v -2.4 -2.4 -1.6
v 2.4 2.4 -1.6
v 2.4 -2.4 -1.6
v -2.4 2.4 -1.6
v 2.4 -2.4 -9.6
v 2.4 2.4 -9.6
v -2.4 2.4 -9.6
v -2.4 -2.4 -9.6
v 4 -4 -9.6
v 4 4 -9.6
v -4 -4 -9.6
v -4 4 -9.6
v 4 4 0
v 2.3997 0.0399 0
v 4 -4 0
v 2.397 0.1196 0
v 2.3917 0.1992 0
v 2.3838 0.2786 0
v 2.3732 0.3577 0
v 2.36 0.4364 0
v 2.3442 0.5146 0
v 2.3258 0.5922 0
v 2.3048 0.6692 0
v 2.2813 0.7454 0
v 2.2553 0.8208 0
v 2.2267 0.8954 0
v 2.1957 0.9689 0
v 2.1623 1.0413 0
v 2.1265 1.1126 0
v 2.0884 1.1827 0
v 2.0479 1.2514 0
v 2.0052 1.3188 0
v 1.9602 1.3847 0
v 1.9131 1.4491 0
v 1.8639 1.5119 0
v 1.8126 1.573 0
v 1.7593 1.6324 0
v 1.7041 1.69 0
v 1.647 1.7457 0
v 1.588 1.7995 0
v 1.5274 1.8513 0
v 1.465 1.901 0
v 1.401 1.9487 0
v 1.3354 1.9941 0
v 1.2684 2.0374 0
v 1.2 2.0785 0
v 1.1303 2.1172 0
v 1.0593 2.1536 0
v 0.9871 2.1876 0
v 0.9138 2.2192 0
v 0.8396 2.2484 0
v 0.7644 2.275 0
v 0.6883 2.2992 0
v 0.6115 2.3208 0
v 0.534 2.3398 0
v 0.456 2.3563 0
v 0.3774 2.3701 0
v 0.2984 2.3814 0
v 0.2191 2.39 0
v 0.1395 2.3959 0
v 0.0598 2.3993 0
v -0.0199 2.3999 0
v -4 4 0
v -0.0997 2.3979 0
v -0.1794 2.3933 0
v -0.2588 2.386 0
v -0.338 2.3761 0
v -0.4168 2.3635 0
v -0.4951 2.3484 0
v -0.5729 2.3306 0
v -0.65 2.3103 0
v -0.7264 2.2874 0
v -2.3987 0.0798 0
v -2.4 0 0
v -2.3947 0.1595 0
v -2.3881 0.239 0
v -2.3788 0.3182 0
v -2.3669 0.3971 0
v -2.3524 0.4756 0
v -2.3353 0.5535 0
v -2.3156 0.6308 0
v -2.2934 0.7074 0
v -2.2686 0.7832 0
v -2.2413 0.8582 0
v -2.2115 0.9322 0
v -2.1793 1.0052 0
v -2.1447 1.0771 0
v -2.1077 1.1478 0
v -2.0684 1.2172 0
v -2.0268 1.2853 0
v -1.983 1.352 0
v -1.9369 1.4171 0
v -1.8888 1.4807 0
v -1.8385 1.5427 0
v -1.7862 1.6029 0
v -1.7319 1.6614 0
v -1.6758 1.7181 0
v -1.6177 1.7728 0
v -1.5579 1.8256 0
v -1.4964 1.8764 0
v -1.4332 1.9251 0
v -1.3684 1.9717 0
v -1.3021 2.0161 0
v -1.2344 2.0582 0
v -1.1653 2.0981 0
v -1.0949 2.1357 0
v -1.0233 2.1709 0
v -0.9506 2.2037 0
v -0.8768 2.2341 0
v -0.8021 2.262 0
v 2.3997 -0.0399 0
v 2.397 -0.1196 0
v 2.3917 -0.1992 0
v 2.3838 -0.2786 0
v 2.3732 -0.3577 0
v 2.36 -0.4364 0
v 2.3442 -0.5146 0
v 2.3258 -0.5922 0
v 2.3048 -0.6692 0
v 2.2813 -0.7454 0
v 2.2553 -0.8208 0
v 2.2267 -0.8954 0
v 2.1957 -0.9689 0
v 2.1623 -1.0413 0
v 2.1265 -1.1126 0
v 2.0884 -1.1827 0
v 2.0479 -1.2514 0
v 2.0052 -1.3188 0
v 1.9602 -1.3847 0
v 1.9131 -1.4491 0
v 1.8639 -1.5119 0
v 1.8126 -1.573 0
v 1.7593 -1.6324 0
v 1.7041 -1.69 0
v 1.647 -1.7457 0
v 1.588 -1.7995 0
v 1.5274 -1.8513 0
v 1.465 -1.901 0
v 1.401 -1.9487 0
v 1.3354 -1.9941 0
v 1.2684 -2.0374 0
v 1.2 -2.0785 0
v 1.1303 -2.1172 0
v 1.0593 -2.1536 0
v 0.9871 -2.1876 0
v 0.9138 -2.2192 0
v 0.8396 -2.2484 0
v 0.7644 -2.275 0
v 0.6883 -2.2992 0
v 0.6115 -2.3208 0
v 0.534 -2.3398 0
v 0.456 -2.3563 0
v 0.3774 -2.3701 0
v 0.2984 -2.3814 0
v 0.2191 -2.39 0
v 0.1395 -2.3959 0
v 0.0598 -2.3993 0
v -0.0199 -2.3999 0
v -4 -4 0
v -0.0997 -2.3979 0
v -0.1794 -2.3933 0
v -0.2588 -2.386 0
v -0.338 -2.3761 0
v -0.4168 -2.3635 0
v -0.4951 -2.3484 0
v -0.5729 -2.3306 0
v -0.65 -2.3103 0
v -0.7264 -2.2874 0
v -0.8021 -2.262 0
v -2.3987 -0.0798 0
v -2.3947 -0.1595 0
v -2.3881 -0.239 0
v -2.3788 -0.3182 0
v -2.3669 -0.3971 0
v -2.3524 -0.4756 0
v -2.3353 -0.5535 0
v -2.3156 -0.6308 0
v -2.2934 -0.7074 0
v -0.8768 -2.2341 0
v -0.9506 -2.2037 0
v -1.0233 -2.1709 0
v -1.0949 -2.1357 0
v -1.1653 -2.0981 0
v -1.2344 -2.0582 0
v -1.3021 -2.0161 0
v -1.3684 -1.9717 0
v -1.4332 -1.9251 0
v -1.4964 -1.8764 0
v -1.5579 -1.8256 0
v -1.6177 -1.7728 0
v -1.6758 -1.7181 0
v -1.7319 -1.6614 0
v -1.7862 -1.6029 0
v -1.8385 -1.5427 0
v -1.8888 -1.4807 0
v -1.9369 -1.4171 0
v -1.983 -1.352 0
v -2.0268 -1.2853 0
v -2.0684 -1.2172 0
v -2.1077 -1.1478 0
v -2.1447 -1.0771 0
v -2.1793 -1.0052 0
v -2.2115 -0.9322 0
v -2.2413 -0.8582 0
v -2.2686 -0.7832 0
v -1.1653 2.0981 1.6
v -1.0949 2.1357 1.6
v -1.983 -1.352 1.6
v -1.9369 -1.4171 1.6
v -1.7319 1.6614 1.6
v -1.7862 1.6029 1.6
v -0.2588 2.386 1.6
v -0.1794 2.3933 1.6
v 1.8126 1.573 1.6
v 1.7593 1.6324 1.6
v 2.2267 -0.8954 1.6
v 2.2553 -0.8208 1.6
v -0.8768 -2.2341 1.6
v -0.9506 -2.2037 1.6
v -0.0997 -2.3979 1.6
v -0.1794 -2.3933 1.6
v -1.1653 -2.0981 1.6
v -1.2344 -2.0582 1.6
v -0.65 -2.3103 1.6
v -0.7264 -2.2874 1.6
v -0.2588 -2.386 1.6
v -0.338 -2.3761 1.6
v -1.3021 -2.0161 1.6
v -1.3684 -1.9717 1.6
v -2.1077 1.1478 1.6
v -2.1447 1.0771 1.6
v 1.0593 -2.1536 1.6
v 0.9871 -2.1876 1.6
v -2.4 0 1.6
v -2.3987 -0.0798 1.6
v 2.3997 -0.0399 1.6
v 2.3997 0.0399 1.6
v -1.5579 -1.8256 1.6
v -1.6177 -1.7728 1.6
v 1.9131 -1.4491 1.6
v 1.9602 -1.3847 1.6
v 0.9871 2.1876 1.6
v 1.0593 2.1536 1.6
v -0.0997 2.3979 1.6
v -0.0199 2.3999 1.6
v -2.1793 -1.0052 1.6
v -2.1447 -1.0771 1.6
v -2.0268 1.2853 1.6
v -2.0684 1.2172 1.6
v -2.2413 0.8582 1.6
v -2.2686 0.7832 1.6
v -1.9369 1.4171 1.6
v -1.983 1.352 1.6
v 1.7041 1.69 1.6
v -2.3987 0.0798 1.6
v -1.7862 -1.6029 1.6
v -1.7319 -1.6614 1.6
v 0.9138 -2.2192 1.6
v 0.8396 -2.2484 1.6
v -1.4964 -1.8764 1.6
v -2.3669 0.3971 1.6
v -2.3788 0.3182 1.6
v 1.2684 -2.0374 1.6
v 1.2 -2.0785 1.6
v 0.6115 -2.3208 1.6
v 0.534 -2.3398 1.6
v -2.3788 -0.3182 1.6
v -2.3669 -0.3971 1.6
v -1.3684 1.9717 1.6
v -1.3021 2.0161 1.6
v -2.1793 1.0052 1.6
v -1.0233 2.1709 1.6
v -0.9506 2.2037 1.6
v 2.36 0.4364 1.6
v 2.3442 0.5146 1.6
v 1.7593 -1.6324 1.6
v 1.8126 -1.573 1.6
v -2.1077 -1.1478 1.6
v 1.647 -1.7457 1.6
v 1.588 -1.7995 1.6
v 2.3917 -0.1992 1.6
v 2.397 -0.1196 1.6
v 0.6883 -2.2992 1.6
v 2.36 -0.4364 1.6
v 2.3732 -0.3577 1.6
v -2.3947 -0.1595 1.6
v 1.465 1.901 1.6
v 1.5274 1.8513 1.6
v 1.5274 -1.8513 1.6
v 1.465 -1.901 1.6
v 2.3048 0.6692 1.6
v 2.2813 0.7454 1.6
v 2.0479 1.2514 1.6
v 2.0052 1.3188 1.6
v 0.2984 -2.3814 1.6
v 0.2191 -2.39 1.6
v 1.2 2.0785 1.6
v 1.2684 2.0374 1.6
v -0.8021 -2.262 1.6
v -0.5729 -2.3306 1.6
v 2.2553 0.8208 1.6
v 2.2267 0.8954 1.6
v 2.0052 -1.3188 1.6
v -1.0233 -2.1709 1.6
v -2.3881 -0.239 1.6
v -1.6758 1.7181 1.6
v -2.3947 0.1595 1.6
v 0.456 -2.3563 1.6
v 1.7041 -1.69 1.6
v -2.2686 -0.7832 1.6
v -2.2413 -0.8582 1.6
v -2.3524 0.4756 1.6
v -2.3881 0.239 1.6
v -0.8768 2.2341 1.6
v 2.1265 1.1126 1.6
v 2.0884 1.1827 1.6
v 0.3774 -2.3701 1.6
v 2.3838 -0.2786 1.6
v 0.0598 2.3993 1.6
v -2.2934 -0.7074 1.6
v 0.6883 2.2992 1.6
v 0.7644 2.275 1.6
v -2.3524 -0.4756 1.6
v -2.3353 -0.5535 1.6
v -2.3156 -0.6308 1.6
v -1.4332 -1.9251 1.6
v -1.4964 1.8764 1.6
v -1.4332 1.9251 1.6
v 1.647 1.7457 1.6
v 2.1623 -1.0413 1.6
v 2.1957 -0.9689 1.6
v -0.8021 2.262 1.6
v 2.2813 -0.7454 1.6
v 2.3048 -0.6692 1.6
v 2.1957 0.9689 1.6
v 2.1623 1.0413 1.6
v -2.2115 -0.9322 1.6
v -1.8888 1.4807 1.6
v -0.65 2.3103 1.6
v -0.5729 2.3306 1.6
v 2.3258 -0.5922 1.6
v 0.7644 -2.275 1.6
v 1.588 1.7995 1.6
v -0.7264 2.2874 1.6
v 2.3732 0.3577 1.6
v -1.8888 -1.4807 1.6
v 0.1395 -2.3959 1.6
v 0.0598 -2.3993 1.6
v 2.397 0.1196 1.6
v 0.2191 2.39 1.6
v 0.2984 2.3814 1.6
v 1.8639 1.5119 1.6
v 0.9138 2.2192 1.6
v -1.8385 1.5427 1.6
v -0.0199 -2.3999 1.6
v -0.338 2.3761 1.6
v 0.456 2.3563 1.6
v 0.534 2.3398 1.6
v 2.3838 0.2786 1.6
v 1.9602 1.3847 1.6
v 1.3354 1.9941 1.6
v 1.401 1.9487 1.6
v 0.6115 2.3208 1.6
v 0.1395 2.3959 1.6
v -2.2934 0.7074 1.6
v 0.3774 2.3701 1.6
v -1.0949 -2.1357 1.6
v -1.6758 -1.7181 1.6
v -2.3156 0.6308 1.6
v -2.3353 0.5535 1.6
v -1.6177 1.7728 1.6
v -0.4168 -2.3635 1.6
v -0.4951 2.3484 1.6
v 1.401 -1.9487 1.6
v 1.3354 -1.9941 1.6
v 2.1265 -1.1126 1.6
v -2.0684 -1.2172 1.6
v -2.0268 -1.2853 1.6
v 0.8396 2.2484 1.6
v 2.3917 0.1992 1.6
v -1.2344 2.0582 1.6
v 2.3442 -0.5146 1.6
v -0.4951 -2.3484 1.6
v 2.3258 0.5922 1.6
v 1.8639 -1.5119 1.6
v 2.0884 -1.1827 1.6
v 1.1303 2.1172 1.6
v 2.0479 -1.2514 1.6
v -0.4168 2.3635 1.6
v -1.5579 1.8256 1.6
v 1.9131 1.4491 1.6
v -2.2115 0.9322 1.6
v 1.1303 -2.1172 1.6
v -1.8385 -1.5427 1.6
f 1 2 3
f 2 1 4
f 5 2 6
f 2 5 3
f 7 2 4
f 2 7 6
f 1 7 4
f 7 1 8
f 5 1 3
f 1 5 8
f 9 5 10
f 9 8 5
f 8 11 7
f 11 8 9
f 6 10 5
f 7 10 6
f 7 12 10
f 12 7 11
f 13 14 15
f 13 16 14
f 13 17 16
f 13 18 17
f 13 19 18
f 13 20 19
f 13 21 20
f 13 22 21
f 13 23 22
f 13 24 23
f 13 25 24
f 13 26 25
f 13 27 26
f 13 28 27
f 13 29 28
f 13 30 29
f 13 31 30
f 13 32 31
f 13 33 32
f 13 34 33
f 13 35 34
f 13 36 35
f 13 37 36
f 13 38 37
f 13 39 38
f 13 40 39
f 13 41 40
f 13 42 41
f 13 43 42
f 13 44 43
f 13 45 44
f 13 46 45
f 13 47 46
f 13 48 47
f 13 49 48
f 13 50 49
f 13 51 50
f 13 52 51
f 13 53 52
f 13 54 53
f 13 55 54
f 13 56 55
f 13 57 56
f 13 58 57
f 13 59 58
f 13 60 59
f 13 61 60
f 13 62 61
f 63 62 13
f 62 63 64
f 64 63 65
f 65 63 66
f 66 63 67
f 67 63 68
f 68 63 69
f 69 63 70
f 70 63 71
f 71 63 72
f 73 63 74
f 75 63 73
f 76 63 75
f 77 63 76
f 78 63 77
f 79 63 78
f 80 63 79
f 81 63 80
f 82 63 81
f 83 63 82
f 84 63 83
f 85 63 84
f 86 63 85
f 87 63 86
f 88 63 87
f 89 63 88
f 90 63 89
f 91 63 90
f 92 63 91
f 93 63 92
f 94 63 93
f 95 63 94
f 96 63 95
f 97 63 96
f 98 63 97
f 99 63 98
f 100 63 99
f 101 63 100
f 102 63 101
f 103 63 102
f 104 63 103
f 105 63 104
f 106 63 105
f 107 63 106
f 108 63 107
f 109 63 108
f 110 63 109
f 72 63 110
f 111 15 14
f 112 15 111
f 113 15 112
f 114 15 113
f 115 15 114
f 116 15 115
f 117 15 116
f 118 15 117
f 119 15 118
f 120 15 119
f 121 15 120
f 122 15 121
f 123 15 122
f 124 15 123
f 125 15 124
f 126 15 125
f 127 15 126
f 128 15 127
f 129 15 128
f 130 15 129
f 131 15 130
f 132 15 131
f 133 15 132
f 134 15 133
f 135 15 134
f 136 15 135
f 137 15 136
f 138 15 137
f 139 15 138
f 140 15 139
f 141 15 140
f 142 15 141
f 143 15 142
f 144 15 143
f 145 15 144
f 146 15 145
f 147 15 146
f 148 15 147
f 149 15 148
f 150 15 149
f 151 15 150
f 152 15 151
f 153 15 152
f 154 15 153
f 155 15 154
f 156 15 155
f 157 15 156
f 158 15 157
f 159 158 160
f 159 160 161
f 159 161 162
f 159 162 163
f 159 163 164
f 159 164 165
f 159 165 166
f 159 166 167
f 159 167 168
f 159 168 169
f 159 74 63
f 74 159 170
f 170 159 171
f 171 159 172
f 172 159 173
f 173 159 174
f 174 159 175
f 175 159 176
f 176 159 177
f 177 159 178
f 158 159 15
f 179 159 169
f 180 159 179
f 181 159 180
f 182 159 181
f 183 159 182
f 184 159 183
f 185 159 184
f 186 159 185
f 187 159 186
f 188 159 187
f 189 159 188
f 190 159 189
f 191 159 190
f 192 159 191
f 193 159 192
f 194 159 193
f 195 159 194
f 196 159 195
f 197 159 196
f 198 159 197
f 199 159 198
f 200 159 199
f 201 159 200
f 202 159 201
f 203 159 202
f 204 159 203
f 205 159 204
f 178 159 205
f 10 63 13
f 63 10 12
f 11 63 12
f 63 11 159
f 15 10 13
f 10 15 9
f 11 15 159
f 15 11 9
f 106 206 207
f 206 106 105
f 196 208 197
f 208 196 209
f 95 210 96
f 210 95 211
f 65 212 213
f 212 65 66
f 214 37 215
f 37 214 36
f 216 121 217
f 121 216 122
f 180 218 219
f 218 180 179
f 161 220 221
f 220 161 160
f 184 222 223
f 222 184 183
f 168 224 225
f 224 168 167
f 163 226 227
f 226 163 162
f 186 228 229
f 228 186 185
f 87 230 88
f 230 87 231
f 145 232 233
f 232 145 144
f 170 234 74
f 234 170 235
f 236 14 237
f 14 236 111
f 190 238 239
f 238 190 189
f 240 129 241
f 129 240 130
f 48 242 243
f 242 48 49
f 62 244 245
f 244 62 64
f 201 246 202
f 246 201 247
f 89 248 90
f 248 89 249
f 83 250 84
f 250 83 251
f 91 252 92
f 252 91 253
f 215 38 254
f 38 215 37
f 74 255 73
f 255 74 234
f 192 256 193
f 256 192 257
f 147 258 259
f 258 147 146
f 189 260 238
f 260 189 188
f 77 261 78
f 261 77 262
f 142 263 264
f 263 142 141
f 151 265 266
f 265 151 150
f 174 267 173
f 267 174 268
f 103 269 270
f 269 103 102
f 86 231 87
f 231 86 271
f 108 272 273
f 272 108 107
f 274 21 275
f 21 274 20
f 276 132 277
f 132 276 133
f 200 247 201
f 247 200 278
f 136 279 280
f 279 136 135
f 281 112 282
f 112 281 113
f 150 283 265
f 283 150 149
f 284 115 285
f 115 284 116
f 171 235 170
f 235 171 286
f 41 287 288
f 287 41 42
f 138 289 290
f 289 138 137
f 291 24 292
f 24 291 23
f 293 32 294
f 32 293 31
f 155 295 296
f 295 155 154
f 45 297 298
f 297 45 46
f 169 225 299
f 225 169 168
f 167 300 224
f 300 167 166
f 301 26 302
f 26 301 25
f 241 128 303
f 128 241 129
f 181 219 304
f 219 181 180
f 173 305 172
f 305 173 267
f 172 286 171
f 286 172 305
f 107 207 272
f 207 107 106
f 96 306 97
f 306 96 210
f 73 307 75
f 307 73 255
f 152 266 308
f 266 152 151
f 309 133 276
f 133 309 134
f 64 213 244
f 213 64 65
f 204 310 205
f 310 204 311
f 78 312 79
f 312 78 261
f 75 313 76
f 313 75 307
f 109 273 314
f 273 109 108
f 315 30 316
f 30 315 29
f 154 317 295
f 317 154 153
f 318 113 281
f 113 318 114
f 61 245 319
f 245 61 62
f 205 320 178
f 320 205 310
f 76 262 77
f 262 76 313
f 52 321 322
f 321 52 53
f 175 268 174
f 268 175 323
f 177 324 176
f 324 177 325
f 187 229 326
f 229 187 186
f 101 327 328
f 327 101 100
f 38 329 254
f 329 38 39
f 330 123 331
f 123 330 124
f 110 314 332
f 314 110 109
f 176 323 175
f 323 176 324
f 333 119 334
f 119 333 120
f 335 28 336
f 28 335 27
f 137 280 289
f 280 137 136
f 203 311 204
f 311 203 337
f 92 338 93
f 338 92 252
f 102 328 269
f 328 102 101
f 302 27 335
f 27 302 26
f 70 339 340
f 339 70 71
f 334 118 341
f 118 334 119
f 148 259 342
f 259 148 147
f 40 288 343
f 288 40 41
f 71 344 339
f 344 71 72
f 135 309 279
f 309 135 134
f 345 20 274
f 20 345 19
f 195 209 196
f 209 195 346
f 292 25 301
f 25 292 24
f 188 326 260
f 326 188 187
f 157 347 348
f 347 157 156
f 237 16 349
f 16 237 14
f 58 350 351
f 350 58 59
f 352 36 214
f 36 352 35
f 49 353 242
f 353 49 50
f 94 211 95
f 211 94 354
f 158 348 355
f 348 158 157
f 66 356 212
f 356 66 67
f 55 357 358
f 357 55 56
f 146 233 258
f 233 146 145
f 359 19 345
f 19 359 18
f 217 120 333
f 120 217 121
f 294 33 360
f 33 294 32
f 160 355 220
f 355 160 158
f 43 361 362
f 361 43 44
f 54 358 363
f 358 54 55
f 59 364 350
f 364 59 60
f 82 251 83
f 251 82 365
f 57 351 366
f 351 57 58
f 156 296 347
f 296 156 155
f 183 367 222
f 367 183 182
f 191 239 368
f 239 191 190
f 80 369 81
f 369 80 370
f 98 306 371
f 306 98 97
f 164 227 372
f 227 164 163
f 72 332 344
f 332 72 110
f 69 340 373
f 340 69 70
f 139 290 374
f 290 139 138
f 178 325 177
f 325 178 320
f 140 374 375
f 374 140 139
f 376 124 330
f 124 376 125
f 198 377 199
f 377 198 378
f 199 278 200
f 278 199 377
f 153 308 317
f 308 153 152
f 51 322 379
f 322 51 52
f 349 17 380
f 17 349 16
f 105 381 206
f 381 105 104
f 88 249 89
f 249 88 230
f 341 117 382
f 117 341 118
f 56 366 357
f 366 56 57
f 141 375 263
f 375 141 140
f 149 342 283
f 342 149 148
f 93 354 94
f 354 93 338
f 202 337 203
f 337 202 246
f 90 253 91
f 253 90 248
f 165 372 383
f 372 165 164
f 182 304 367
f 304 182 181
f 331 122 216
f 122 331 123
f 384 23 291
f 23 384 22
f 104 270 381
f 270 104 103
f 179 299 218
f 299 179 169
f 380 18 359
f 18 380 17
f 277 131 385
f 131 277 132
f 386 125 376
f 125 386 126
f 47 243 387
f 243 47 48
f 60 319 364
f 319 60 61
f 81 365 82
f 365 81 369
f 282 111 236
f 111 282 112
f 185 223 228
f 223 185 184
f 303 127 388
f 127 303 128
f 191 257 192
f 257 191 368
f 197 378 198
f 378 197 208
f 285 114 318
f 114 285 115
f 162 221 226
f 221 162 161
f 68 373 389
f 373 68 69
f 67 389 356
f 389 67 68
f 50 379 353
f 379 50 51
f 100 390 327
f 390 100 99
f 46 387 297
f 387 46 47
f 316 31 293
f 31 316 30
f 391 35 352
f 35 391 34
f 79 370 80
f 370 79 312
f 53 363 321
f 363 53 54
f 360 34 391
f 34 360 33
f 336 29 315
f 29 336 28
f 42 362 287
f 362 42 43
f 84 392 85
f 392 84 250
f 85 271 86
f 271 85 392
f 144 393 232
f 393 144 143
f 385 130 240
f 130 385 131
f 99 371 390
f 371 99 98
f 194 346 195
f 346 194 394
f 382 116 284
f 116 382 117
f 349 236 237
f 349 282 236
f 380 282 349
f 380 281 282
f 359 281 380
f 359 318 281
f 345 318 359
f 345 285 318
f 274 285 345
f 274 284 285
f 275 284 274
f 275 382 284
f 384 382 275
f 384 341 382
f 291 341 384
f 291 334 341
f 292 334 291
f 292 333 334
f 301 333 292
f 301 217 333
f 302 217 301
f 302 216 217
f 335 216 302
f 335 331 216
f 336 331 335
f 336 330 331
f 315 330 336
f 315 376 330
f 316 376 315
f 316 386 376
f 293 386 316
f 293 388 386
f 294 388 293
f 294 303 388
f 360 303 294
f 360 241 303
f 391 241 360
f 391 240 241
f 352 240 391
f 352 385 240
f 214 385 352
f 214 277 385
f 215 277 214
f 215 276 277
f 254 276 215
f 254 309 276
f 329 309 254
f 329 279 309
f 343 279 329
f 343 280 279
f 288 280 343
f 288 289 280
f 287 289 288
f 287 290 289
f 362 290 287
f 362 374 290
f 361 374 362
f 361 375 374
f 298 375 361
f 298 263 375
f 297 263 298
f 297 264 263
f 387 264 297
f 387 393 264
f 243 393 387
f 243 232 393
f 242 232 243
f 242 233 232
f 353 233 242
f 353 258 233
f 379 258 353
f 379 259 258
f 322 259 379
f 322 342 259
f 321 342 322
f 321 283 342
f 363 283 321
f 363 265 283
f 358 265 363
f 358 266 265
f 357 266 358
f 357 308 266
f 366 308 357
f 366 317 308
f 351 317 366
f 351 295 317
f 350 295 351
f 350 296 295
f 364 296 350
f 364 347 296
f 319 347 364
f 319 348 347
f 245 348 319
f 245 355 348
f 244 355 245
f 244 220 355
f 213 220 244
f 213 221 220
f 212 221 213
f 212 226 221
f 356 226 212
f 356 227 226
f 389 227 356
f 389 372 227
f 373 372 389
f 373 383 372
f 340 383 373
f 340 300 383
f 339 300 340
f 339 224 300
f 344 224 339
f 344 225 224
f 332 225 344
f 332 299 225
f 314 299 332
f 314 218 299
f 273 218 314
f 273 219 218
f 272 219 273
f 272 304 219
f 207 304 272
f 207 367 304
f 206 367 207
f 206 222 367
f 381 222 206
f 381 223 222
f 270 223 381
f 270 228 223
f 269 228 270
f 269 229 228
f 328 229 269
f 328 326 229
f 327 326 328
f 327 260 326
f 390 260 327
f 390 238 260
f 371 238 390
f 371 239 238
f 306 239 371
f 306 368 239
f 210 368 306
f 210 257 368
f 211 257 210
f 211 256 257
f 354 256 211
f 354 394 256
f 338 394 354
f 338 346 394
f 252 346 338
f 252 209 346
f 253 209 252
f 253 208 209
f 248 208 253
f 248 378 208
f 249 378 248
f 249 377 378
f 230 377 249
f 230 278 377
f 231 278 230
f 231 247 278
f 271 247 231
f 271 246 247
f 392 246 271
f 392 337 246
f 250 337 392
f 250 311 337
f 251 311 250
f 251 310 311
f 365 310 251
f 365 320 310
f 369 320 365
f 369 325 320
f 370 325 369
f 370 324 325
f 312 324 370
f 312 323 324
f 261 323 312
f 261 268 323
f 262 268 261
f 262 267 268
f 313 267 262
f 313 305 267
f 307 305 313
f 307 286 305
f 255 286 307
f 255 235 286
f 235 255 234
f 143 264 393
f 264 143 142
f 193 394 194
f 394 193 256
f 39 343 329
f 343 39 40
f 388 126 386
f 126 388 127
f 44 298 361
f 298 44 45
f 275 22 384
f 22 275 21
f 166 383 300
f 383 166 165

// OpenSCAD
use <../lib.scad>
use <s/3005pz0s01.scad>
use <s/3005s01.scad>
$fa=1; $fs=0.2;
function ldraw_lib__3005pz0(realsolid=false) = [
// 0 Brick  1 x  1 with Gryffindor House Lion Crest Emblem Pattern
// 0 Name: 3005pz0.dat
// 0 Author: Vincent Messenet [Cheenzo]
// 0 !LDRAW_ORG Part UPDATE 2019-01
// 0 !LICENSE Licensed under CC BY 2.0 and CC BY 4.0 : see CAreadme.txt
// 
// 0 BFC CERTIFY CCW
  [0,"BFC","CERTIFY"],
  [0,"BFC","CCW"],
// 
// 0 !KEYWORDS Brickheadz, BrickLink 3005pb031, Harry Potter, Set 41615
// 
// 0 !HISTORY 2019-06-28 [PTadmin] Official Update 2019-01
// 
// 
// 1 16 0 0 0 1 0 0 0 1 0 0 0 1 s\3005s01.dat
  [1,16,0,0,0,1,0,0,0,1,0,0,0,1, ldraw_lib__s__3005s01(realsolid)],
// 1 16 0 0 -10 1 0 0 0 1 0 0 0 1 s\3005pz0s01.dat
  [1,16,0,0,-10,1,0,0,0,1,0,0,0,1, ldraw_lib__s__3005pz0s01(realsolid)],
// 1 16 0 0 -10 -1 0 0 0 1 0 0 0 1 s\3005pz0s01.dat
  [1,16,0,0,-10,-1,0,0,0,1,0,0,0,1, ldraw_lib__s__3005pz0s01(realsolid)],
// 
// 0 // Dark Red Crest Inner Shape
// 4 320 -1.24 5.64 -10 -.33 7.61 -10 0 6.98 -10 0 5.63 -10
  [4,320,-1.24,5.64,-10,-.33,7.61,-10,0,6.98,-10,0,5.63,-10],
// 4 320 -2.23 5.74 -10 -1.07 7.9 -10 -.33 7.61 -10 -1.24 5.64 -10
  [4,320,-2.23,5.74,-10,-1.07,7.9,-10,-.33,7.61,-10,-1.24,5.64,-10],
// 3 320 -2.23 5.74 -10 -1.81 8.32 -10 -1.07 7.9 -10
  [3,320,-2.23,5.74,-10,-1.81,8.32,-10,-1.07,7.9,-10],
// 4 320 -3.54 5.96 -10 -3.03 8.65 -10 -1.81 8.32 -10 -2.23 5.74 -10
  [4,320,-3.54,5.96,-10,-3.03,8.65,-10,-1.81,8.32,-10,-2.23,5.74,-10],
// 3 320 -3.03 8.65 -10 -2.73 8.72 -10 -1.81 8.32 -10
  [3,320,-3.03,8.65,-10,-2.73,8.72,-10,-1.81,8.32,-10],
// 4 320 -2.73 8.72 -10 -2.33 8.85 -10 -1.81 8.63 -10 -1.81 8.32 -10
  [4,320,-2.73,8.72,-10,-2.33,8.85,-10,-1.81,8.63,-10,-1.81,8.32,-10],
// 4 320 -2.33 8.85 -10 -2.13 9.23 -10 -1.64 8.76 -10 -1.81 8.63 -10
  [4,320,-2.33,8.85,-10,-2.13,9.23,-10,-1.64,8.76,-10,-1.81,8.63,-10],
// 4 320 -2.13 9.23 -10 -1.45 9.14 -10 -1.45 8.74 -10 -1.64 8.76 -10
  [4,320,-2.13,9.23,-10,-1.45,9.14,-10,-1.45,8.74,-10,-1.64,8.76,-10],
// 4 320 -2.13 9.23 -10 -1.68 9.61 -10 -1.42 9.41 -10 -1.45 9.14 -10
  [4,320,-2.13,9.23,-10,-1.68,9.61,-10,-1.42,9.41,-10,-1.45,9.14,-10],
// 4 320 -1.45 8.74 -10 -1.45 9.14 -10 -.92 9.05 -10 -1.05 8.54 -10
  [4,320,-1.45,8.74,-10,-1.45,9.14,-10,-.92,9.05,-10,-1.05,8.54,-10],
// 4 320 -1.05 8.54 -10 -.92 9.05 -10 -.65 8.84 -10 -.71 8.67 -10
  [4,320,-1.05,8.54,-10,-.92,9.05,-10,-.65,8.84,-10,-.71,8.67,-10],
// 4 320 -5.48 6.63 -10 -3.36 8.84 -10 -3.03 8.65 -10 -3.54 5.96 -10
  [4,320,-5.48,6.63,-10,-3.36,8.84,-10,-3.03,8.65,-10,-3.54,5.96,-10],
// 4 320 -5.54 8.26 -10 -3.62 9.23 -10 -3.36 8.84 -10 -5.48 6.63 -10
  [4,320,-5.54,8.26,-10,-3.62,9.23,-10,-3.36,8.84,-10,-5.48,6.63,-10],
// 4 320 -5.54 8.26 -10 -5.54 10.5 -10 -3.61 9.37 -10 -3.62 9.23 -10
  [4,320,-5.54,8.26,-10,-5.54,10.5,-10,-3.61,9.37,-10,-3.62,9.23,-10],
// 4 320 -5.54 10.5 -10 -3.36 9.65 -10 -3.38 9.48 -10 -3.61 9.37 -10
  [4,320,-5.54,10.5,-10,-3.36,9.65,-10,-3.38,9.48,-10,-3.61,9.37,-10],
// 4 320 -5.54 10.5 -10 -5.32 12.33 -10 -4.46 12.28 -10 -3.36 9.65 -10
  [4,320,-5.54,10.5,-10,-5.32,12.33,-10,-4.46,12.28,-10,-3.36,9.65,-10],
// 3 320 -4.46 12.28 -10 -3.71 11.75 -10 -3.36 9.65 -10
  [3,320,-4.46,12.28,-10,-3.71,11.75,-10,-3.36,9.65,-10],
// 4 320 -3.71 11.75 -10 -3.25 11.36 -10 -3.11 9.62 -10 -3.36 9.65 -10
  [4,320,-3.71,11.75,-10,-3.25,11.36,-10,-3.11,9.62,-10,-3.36,9.65,-10],
// 4 320 -3.25 11.36 -10 -2.52 11.44 -10 -2.93 9.51 -10 -3.11 9.62 -10
  [4,320,-3.25,11.36,-10,-2.52,11.44,-10,-2.93,9.51,-10,-3.11,9.62,-10],
// 4 320 -2.42 10.02 -10 -2.64 9.61 -10 -2.93 9.51 -10 -2.52 11.44 -10
  [4,320,-2.42,10.02,-10,-2.64,9.61,-10,-2.93,9.51,-10,-2.52,11.44,-10],
// 3 320 -2.52 11.44 -10 -2.1 10.51 -10 -2.42 10.02 -10
  [3,320,-2.52,11.44,-10,-2.1,10.51,-10,-2.42,10.02,-10],
// 3 320 -2.52 11.44 -10 -1.77 10.74 -10 -2.1 10.51 -10
  [3,320,-2.52,11.44,-10,-1.77,10.74,-10,-2.1,10.51,-10],
// 4 320 -2.52 11.44 -10 -1.74 11.17 -10 -1.65 11.01 -10 -1.77 10.74 -10
  [4,320,-2.52,11.44,-10,-1.74,11.17,-10,-1.65,11.01,-10,-1.77,10.74,-10],
// 4 320 -4.46 12.28 -10 -3.95 12.77 -10 -3.73 12.15 -10 -3.71 11.75 -10
  [4,320,-4.46,12.28,-10,-3.95,12.77,-10,-3.73,12.15,-10,-3.71,11.75,-10],
// 4 320 -3.95 12.77 -10 -3.21 12.89 -10 -2.35 12.06 -10 -3.73 12.15 -10
  [4,320,-3.95,12.77,-10,-3.21,12.89,-10,-2.35,12.06,-10,-3.73,12.15,-10],
// 3 320 -3.21 12.89 -10 -2.38 12.7 -10 -2.35 12.06 -10
  [3,320,-3.21,12.89,-10,-2.38,12.7,-10,-2.35,12.06,-10],
// 4 320 -2.38 12.7 -10 -1.38 11.89 -10 -1.47 11.68 -10 -2.35 12.06 -10
  [4,320,-2.38,12.7,-10,-1.38,11.89,-10,-1.47,11.68,-10,-2.35,12.06,-10],
// 4 320 -2.38 12.7 -10 -2.26 12.89 -10 -1.46 12.7 -10 -1.38 11.89 -10
  [4,320,-2.38,12.7,-10,-2.26,12.89,-10,-1.46,12.7,-10,-1.38,11.89,-10],
// 3 320 -1.46 12.7 -10 -.97 12.08 -10 -1.38 11.89 -10
  [3,320,-1.46,12.7,-10,-.97,12.08,-10,-1.38,11.89,-10],
// 4 320 -1.46 12.7 -10 -.83 12.57 -10 -.7 12.43 -10 -.97 12.08 -10
  [4,320,-1.46,12.7,-10,-.83,12.57,-10,-.7,12.43,-10,-.97,12.08,-10],
// 4 320 -2.45 13.15 -10 -1.81 13.04 -10 -1.46 12.7 -10 -2.26 12.89 -10
  [4,320,-2.45,13.15,-10,-1.81,13.04,-10,-1.46,12.7,-10,-2.26,12.89,-10],
// 4 320 -1.81 13.04 -10 -2.45 13.15 -10 -2.24 13.87 -10 -1.81 13.32 -10
  [4,320,-1.81,13.04,-10,-2.45,13.15,-10,-2.24,13.87,-10,-1.81,13.32,-10],
// 4 320 -2.24 13.87 -10 -1.85 13.83 -10 -1.64 13.54 -10 -1.81 13.32 -10
  [4,320,-2.24,13.87,-10,-1.85,13.83,-10,-1.64,13.54,-10,-1.81,13.32,-10],
// 4 320 -3.06 13.7 -10 -2.24 13.87 -10 -2.45 13.15 -10 -2.82 13.08 -10
  [4,320,-3.06,13.7,-10,-2.24,13.87,-10,-2.45,13.15,-10,-2.82,13.08,-10],
// 3 320 -3.33 13.24 -10 -3.06 13.7 -10 -2.82 13.08 -10
  [3,320,-3.33,13.24,-10,-3.06,13.7,-10,-2.82,13.08,-10],
// 4 320 -3.71 13.66 -10 -3.22 13.87 -10 -3.06 13.7 -10 -3.33 13.24 -10
  [4,320,-3.71,13.66,-10,-3.22,13.87,-10,-3.06,13.7,-10,-3.33,13.24,-10],
// 4 320 -3.71 13.66 -10 -3.52 14.9 -10 -3.18 14.14 -10 -3.22 13.87 -10
  [4,320,-3.71,13.66,-10,-3.52,14.9,-10,-3.18,14.14,-10,-3.22,13.87,-10],
// 3 320 -3.22 13.87 -10 -3.18 14.14 -10 -2.97 14.08 -10
  [3,320,-3.22,13.87,-10,-3.18,14.14,-10,-2.97,14.08,-10],
// 3 320 -3.52 14.9 -10 -3.08 14.27 -10 -3.18 14.14 -10
  [3,320,-3.52,14.9,-10,-3.08,14.27,-10,-3.18,14.14,-10],
// 4 320 -2.9 14.64 -10 -2.825 14.39 -10 -3.08 14.27 -10 -3.52 14.9 -10
  [4,320,-2.9,14.64,-10,-2.825,14.39,-10,-3.08,14.27,-10,-3.52,14.9,-10],
// 4 320 -3.52 14.9 -10 -2.94 15.35 -10 -2.59 14.66 -10 -2.9 14.64 -10
  [4,320,-3.52,14.9,-10,-2.94,15.35,-10,-2.59,14.66,-10,-2.9,14.64,-10],
// 3 320 -2.94 15.35 -10 -2.49 15.36 -10 -2.59 14.66 -10
  [3,320,-2.94,15.35,-10,-2.49,15.36,-10,-2.59,14.66,-10],
// 4 320 -2.59 14.66 -10 -2.49 15.36 -10 -1.83 15.01 -10 -2.27 14.43 -10
  [4,320,-2.59,14.66,-10,-2.49,15.36,-10,-1.83,15.01,-10,-2.27,14.43,-10],
// 4 320 -2.27 14.43 -10 -1.83 15.01 -10 -.87 14.79 -10 -1.19 14.19 -10
  [4,320,-2.27,14.43,-10,-1.83,15.01,-10,-.87,14.79,-10,-1.19,14.19,-10],
// 3 320 -1.19 14.19 -10 -.87 14.79 -10 -.51 14.18 -10
  [3,320,-1.19,14.19,-10,-.87,14.79,-10,-.51,14.18,-10],
// 4 320 -.87 14.79 -10 -.48 14.93 -10 -.11 14.53 -10 -.51 14.18 -10
  [4,320,-.87,14.79,-10,-.48,14.93,-10,-.11,14.53,-10,-.51,14.18,-10],
// 3 320 -.48 14.93 -10 .15 15.21 -10 -.11 14.53 -10
  [3,320,-.48,14.93,-10,.15,15.21,-10,-.11,14.53,-10],
// 4 320 -.55 15.25 -10 0 15.57 -10 .15 15.21 -10 -.48 14.93 -10
  [4,320,-.55,15.25,-10,0,15.57,-10,.15,15.21,-10,-.48,14.93,-10],
// 4 320 -.78 15.36 -10 -.53 15.91 -10 0 15.57 -10 -.55 15.25 -10
  [4,320,-.78,15.36,-10,-.53,15.91,-10,0,15.57,-10,-.55,15.25,-10],
// 4 320 -1.3 15.52 -10 -.89 15.92 -10 -.53 15.91 -10 -.78 15.36 -10
  [4,320,-1.3,15.52,-10,-.89,15.92,-10,-.53,15.91,-10,-.78,15.36,-10],
// 4 320 -1.67 15.88 -10 -1.19 16.1 -10 -.89 15.92 -10 -1.3 15.52 -10
  [4,320,-1.67,15.88,-10,-1.19,16.1,-10,-.89,15.92,-10,-1.3,15.52,-10],
// 3 320 -1.69 16.51 -10 -1.19 16.1 -10 -1.67 15.88 -10
  [3,320,-1.69,16.51,-10,-1.19,16.1,-10,-1.67,15.88,-10],
// 4 320 -1.69 16.51 -10 -1.52 16.87 -10 -.94 16.28 -10 -1.19 16.1 -10
  [4,320,-1.69,16.51,-10,-1.52,16.87,-10,-.94,16.28,-10,-1.19,16.1,-10],
// 4 320 -.94 16.28 -10 -1.52 16.87 -10 -1.08 17.37 -10 -.89 16.68 -10
  [4,320,-.94,16.28,-10,-1.52,16.87,-10,-1.08,17.37,-10,-.89,16.68,-10],
// 4 320 -1.08 17.37 -10 -.28 16.72 -10 -.55 16.52 -10 -.89 16.68 -10
  [4,320,-1.08,17.37,-10,-.28,16.72,-10,-.55,16.52,-10,-.89,16.68,-10],
// 3 320 -1.08 17.37 -10 0 17.48 -10 -.28 16.72 -10
  [3,320,-1.08,17.37,-10,0,17.48,-10,-.28,16.72,-10],
// 4 320 -.28 16.72 -10 0 17.48 -10 2.77 17.55 -10 .71 15.61 -10
  [4,320,-.28,16.72,-10,0,17.48,-10,2.77,17.55,-10,.71,15.61,-10],
// 4 320 2.77 17.55 -10 0 17.48 -10 0 19.61 -10 1.56 18.69 -10
  [4,320,2.77,17.55,-10,0,17.48,-10,0,19.61,-10,1.56,18.69,-10],
// 4 320 .71 15.61 -10 2.77 17.55 -10 4 15.7 -10 1.14 14.89 -10
  [4,320,.71,15.61,-10,2.77,17.55,-10,4,15.7,-10,1.14,14.89,-10],
// 3 320 1.14 14.89 -10 4 15.7 -10 2.25 14.72 -10
  [3,320,1.14,14.89,-10,4,15.7,-10,2.25,14.72,-10],
// 4 320 1.14 14.89 -10 2.25 14.72 -10 1.81 14.4 -10 1.23 14.61 -10
  [4,320,1.14,14.89,-10,2.25,14.72,-10,1.81,14.4,-10,1.23,14.61,-10],
// 3 320 1.23 14.61 -10 1.81 14.4 -10 1.66 13.81 -10
  [3,320,1.23,14.61,-10,1.81,14.4,-10,1.66,13.81,-10],
// 4 320 1.66 13.81 -10 1.22 13.45 -10 .9 13.56 -10 1.23 14.61 -10
  [4,320,1.66,13.81,-10,1.22,13.45,-10,.9,13.56,-10,1.23,14.61,-10],
// 4 320 2.25 14.72 -10 4 15.7 -10 4.7 14.06 -10 2.37 14.46 -10
  [4,320,2.25,14.72,-10,4,15.7,-10,4.7,14.06,-10,2.37,14.46,-10],
// 4 320 2.37 14.46 -10 4.7 14.06 -10 2.89 13.77 -10 2.42 13.94 -10
  [4,320,2.37,14.46,-10,4.7,14.06,-10,2.89,13.77,-10,2.42,13.94,-10],
// 4 320 2.89 13.77 -10 4.7 14.06 -10 5.32 12.33 -10 3.01 13.46 -10
  [4,320,2.89,13.77,-10,4.7,14.06,-10,5.32,12.33,-10,3.01,13.46,-10],
// 4 320 3.01 12.79 -10 3.01 13.46 -10 5.32 12.33 -10 3.54 12.33 -10
  [4,320,3.01,12.79,-10,3.01,13.46,-10,5.32,12.33,-10,3.54,12.33,-10],
// 4 320 2.62 12.13 -10 3.01 12.79 -10 3.54 12.33 -10 3.48 12.09 -10
  [4,320,2.62,12.13,-10,3.01,12.79,-10,3.54,12.33,-10,3.48,12.09,-10],
// 4 320 2.62 12.13 -10 3.48 12.09 -10 3.37 11.45 -10 3.06 11.45 -10
  [4,320,2.62,12.13,-10,3.48,12.09,-10,3.37,11.45,-10,3.06,11.45,-10],
// 4 320 2.55 11.8 -10 2.62 12.13 -10 3.06 11.45 -10 2.84 11.32 -10
  [4,320,2.55,11.8,-10,2.62,12.13,-10,3.06,11.45,-10,2.84,11.32,-10],
// 4 320 2.43 10.89 -10 2.55 11.8 -10 2.84 11.32 -10 2.73 11.01 -10
  [4,320,2.43,10.89,-10,2.55,11.8,-10,2.84,11.32,-10,2.73,11.01,-10],
// 4 320 2.43 10.89 -10 2.73 11.01 -10 2.74 10.47 -10 2.52 10.51 -10
  [4,320,2.43,10.89,-10,2.73,11.01,-10,2.74,10.47,-10,2.52,10.51,-10],
// 3 320 2.52 10.51 -10 2.74 10.47 -10 2.65 10.37 -10
  [3,320,2.52,10.51,-10,2.74,10.47,-10,2.65,10.37,-10],
// 4 320 3.37 11.45 -10 3.48 12.09 -10 4.25 11.84 -10 3.71 11.3 -10
  [4,320,3.37,11.45,-10,3.48,12.09,-10,4.25,11.84,-10,3.71,11.3,-10],
// 4 320 3.71 11.3 -10 4.25 11.84 -10 4.6 11.42 -10 3.81 11.16 -10
  [4,320,3.71,11.3,-10,4.25,11.84,-10,4.6,11.42,-10,3.81,11.16,-10],
// 4 320 4.6 11.42 -10 4.64 11.01 -10 4.55 10.7 -10 3.81 11.16 -10
  [4,320,4.6,11.42,-10,4.64,11.01,-10,4.55,10.7,-10,3.81,11.16,-10],
// 4 320 4.55 10.7 -10 4.12 10.54 -10 3.33 10.81 -10 3.81 11.16 -10
  [4,320,4.55,10.7,-10,4.12,10.54,-10,3.33,10.81,-10,3.81,11.16,-10],
// 4 320 3.33 10.81 -10 4.12 10.54 -10 3.98 9.77 -10 3.31 10.07 -10
  [4,320,3.33,10.81,-10,4.12,10.54,-10,3.98,9.77,-10,3.31,10.07,-10],
// 4 320 3.03 9.79 -10 3.31 10.07 -10 3.98 9.77 -10 3.65 9.37 -10
  [4,320,3.03,9.79,-10,3.31,10.07,-10,3.98,9.77,-10,3.65,9.37,-10],
// 3 320 3.03 9.79 -10 3.65 9.37 -10 3.2 9.09 -10
  [3,320,3.03,9.79,-10,3.65,9.37,-10,3.2,9.09,-10],
// 4 320 2.69 9.7 -10 3.03 9.79 -10 3.2 9.09 -10 2.7 9.05 -10
  [4,320,2.69,9.7,-10,3.03,9.79,-10,3.2,9.09,-10,2.7,9.05,-10],
// 4 320 2.09 9.16 -10 2.27 9.75 -10 2.69 9.7 -10 2.7 9.05 -10
  [4,320,2.09,9.16,-10,2.27,9.75,-10,2.69,9.7,-10,2.7,9.05,-10],
// 4 320 1.21 9.38 -10 1.16 9.7 -10 2.27 9.75 -10 2.09 9.16 -10
  [4,320,1.21,9.38,-10,1.16,9.7,-10,2.27,9.75,-10,2.09,9.16,-10],
// 4 320 1.21 9.38 -10 2.09 9.16 -10 1.98 8.48 -10 1.32 8.79 -10
  [4,320,1.21,9.38,-10,2.09,9.16,-10,1.98,8.48,-10,1.32,8.79,-10],
// 4 320 .82 8.34 -10 1.32 8.79 -10 1.98 8.48 -10 1.66 7.83 -10
  [4,320,.82,8.34,-10,1.32,8.79,-10,1.98,8.48,-10,1.66,7.83,-10],
// 4 320 .82 8.34 -10 1.66 7.83 -10 1.1 7.33 -10 .88 8.03 -10
  [4,320,.82,8.34,-10,1.66,7.83,-10,1.1,7.33,-10,.88,8.03,-10],
// 4 320 .41 7.72 -10 .47 7.9 -10 .88 8.03 -10 1.1 7.33 -10
  [4,320,.41,7.72,-10,.47,7.9,-10,.88,8.03,-10,1.1,7.33,-10],
// 3 320 .41 7.72 -10 1.1 7.33 -10 .59 7.01 -10
  [3,320,.41,7.72,-10,1.1,7.33,-10,.59,7.01,-10],
// 4 320 -.33 7.61 -10 .41 7.72 -10 .59 7.01 -10 0 6.98 -10
  [4,320,-.33,7.61,-10,.41,7.72,-10,.59,7.01,-10,0,6.98,-10],
// 4 320 .88 10.34 -10 1.98 10.11 -10 2.27 9.75 -10 1.16 9.7 -10
  [4,320,.88,10.34,-10,1.98,10.11,-10,2.27,9.75,-10,1.16,9.7,-10],
// 4 320 .88 10.34 -10 .94 10.74 -10 1.86 10.58 -10 1.98 10.11 -10
  [4,320,.88,10.34,-10,.94,10.74,-10,1.86,10.58,-10,1.98,10.11,-10],
// 4 320 .74 11.22 -10 1.86 11.42 -10 1.86 10.58 -10 .94 10.74 -10
  [4,320,.74,11.22,-10,1.86,11.42,-10,1.86,10.58,-10,.94,10.74,-10],
// 4 320 .74 11.22 -10 .97 12.05 -10 1.92 11.81 -10 1.86 11.42 -10
  [4,320,.74,11.22,-10,.97,12.05,-10,1.92,11.81,-10,1.86,11.42,-10],
// 4 320 .97 12.05 -10 1.08 12.71 -10 2.12 12.37 -10 1.92 11.81 -10
  [4,320,.97,12.05,-10,1.08,12.71,-10,2.12,12.37,-10,1.92,11.81,-10],
// 4 320 1.08 12.71 -10 1.85 13.33 -10 2.37 12.96 -10 2.12 12.37 -10
  [4,320,1.08,12.71,-10,1.85,13.33,-10,2.37,12.96,-10,2.12,12.37,-10],
// 4 320 1.85 13.33 -10 2.16 13.5 -10 2.5 13.33 -10 2.37 12.96 -10
  [4,320,1.85,13.33,-10,2.16,13.5,-10,2.5,13.33,-10,2.37,12.96,-10],
// 
// 0 // Bottom Left Light Yellow Crest Inner Shape
// 3 18 -5.32 12.33 -10 -3.95 12.77 -10 -4.46 12.28 -10
  [3,18,-5.32,12.33,-10,-3.95,12.77,-10,-4.46,12.28,-10],
// 4 18 -5.32 12.33 -10 -4.7 14.06 -10 -3.71 13.66 -10 -3.95 12.77 -10
  [4,18,-5.32,12.33,-10,-4.7,14.06,-10,-3.71,13.66,-10,-3.95,12.77,-10],
// 4 18 -3.95 12.77 -10 -3.71 13.66 -10 -3.33 13.24 -10 -3.21 12.89 -10
  [4,18,-3.95,12.77,-10,-3.71,13.66,-10,-3.33,13.24,-10,-3.21,12.89,-10],
// 4 18 -3.33 13.24 -10 -2.82 13.08 -10 -2.38 12.7 -10 -3.21 12.89 -10
  [4,18,-3.33,13.24,-10,-2.82,13.08,-10,-2.38,12.7,-10,-3.21,12.89,-10],
// 4 18 -2.82 13.08 -10 -2.45 13.15 -10 -2.26 12.89 -10 -2.38 12.7 -10
  [4,18,-2.82,13.08,-10,-2.45,13.15,-10,-2.26,12.89,-10,-2.38,12.7,-10],
// 4 18 -4.7 14.06 -10 -4 15.7 -10 -3.52 14.9 -10 -3.71 13.66 -10
  [4,18,-4.7,14.06,-10,-4,15.7,-10,-3.52,14.9,-10,-3.71,13.66,-10],
// 3 18 -4 15.7 -10 -2.94 15.35 -10 -3.52 14.9 -10
  [3,18,-4,15.7,-10,-2.94,15.35,-10,-3.52,14.9,-10],
// 4 18 -4 15.7 -10 -2.77 17.55 -10 -1.69 16.51 -10 -2.94 15.35 -10
  [4,18,-4,15.7,-10,-2.77,17.55,-10,-1.69,16.51,-10,-2.94,15.35,-10],
// 4 18 -2.94 15.35 -10 -1.69 16.51 -10 -1.67 15.88 -10 -2.49 15.36 -10
  [4,18,-2.94,15.35,-10,-1.69,16.51,-10,-1.67,15.88,-10,-2.49,15.36,-10],
// 4 18 -2.49 15.36 -10 -1.67 15.88 -10 -1.3 15.52 -10 -1.83 15.01 -10
  [4,18,-2.49,15.36,-10,-1.67,15.88,-10,-1.3,15.52,-10,-1.83,15.01,-10],
// 4 18 -1.83 15.01 -10 -1.3 15.52 -10 -.78 15.36 -10 -.87 14.79 -10
  [4,18,-1.83,15.01,-10,-1.3,15.52,-10,-.78,15.36,-10,-.87,14.79,-10],
// 4 18 -.87 14.79 -10 -.78 15.36 -10 -.55 15.25 -10 -.48 14.93 -10
  [4,18,-.87,14.79,-10,-.78,15.36,-10,-.55,15.25,-10,-.48,14.93,-10],
// 3 18 -2.77 17.55 -10 -1.52 16.87 -10 -1.69 16.51 -10
  [3,18,-2.77,17.55,-10,-1.52,16.87,-10,-1.69,16.51,-10],
// 4 18 -2.77 17.55 -10 -1.56 18.69 -10 -1.08 17.37 -10 -1.52 16.87 -10
  [4,18,-2.77,17.55,-10,-1.56,18.69,-10,-1.08,17.37,-10,-1.52,16.87,-10],
// 4 18 -1.56 18.69 -10 0 19.61 -10 0 17.48 -10 -1.08 17.37 -10
  [4,18,-1.56,18.69,-10,0,19.61,-10,0,17.48,-10,-1.08,17.37,-10],
// 
// 0 // Top Right Light Yellow Crest Inner Shape
// 4 18 0 5.63 -10 0 6.98 -10 .59 7.01 -10 1.24 5.64 -10
  [4,18,0,5.63,-10,0,6.98,-10,.59,7.01,-10,1.24,5.64,-10],
// 4 18 .59 7.01 -10 1.1 7.33 -10 2.23 5.74 -10 1.24 5.64 -10
  [4,18,.59,7.01,-10,1.1,7.33,-10,2.23,5.74,-10,1.24,5.64,-10],
// 4 18 1.1 7.33 -10 1.66 7.83 -10 3.54 5.96 -10 2.23 5.74 -10
  [4,18,1.1,7.33,-10,1.66,7.83,-10,3.54,5.96,-10,2.23,5.74,-10],
// 4 18 1.66 7.83 -10 1.98 8.48 -10 5.48 6.63 -10 3.54 5.96 -10
  [4,18,1.66,7.83,-10,1.98,8.48,-10,5.48,6.63,-10,3.54,5.96,-10],
// 4 18 1.98 8.48 -10 2.09 9.16 -10 2.7 9.05 -10 5.48 6.63 -10
  [4,18,1.98,8.48,-10,2.09,9.16,-10,2.7,9.05,-10,5.48,6.63,-10],
// 3 18 2.7 9.05 -10 3.2 9.09 -10 5.48 6.63 -10
  [3,18,2.7,9.05,-10,3.2,9.09,-10,5.48,6.63,-10],
// 4 18 3.2 9.09 -10 3.65 9.37 -10 5.54 8.26 -10 5.48 6.63 -10
  [4,18,3.2,9.09,-10,3.65,9.37,-10,5.54,8.26,-10,5.48,6.63,-10],
// 3 18 3.65 9.37 -10 3.98 9.77 -10 5.54 8.26 -10
  [3,18,3.65,9.37,-10,3.98,9.77,-10,5.54,8.26,-10],
// 4 18 4.55 10.7 -10 5.54 8.26 -10 3.98 9.77 -10 4.12 10.54 -10
  [4,18,4.55,10.7,-10,5.54,8.26,-10,3.98,9.77,-10,4.12,10.54,-10],
// 4 18 5.54 8.26 -10 4.55 10.7 -10 4.64 11.01 -10 5.54 10.5 -10
  [4,18,5.54,8.26,-10,4.55,10.7,-10,4.64,11.01,-10,5.54,10.5,-10],
// 4 18 4.6 11.42 -10 5.32 12.33 -10 5.54 10.5 -10 4.64 11.01 -10
  [4,18,4.6,11.42,-10,5.32,12.33,-10,5.54,10.5,-10,4.64,11.01,-10],
// 3 18 4.25 11.84 -10 5.32 12.33 -10 4.6 11.42 -10
  [3,18,4.25,11.84,-10,5.32,12.33,-10,4.6,11.42,-10],
// 4 18 3.54 12.33 -10 5.32 12.33 -10 4.25 11.84 -10 3.48 12.09 -10
  [4,18,3.54,12.33,-10,5.32,12.33,-10,4.25,11.84,-10,3.48,12.09,-10],
// 
// 0 // Metallic Gold Lion Shape
// 4 82 -1.81 8.32 -10 -1.81 8.63 -10 -1.64 8.76 -10 -1.45 8.74 -10
  [4,82,-1.81,8.32,-10,-1.81,8.63,-10,-1.64,8.76,-10,-1.45,8.74,-10],
// 4 82 -1.81 8.32 -10 -1.45 8.74 -10 -1.05 8.54 -10 -1.07 7.9 -10
  [4,82,-1.81,8.32,-10,-1.45,8.74,-10,-1.05,8.54,-10,-1.07,7.9,-10],
// 4 82 -1.07 7.9 -10 -1.05 8.54 -10 -.71 8.67 -10 -.33 7.61 -10
  [4,82,-1.07,7.9,-10,-1.05,8.54,-10,-.71,8.67,-10,-.33,7.61,-10],
// 4 82 -.71 8.67 -10 -.65 8.84 -10 .41 7.72 -10 -.33 7.61 -10
  [4,82,-.71,8.67,-10,-.65,8.84,-10,.41,7.72,-10,-.33,7.61,-10],
// 3 82 -.65 8.84 -10 .47 7.9 -10 .41 7.72 -10
  [3,82,-.65,8.84,-10,.47,7.9,-10,.41,7.72,-10],
// 4 82 .47 7.9 -10 -.65 8.84 -10 .82 8.34 -10 .88 8.03 -10
  [4,82,.47,7.9,-10,-.65,8.84,-10,.82,8.34,-10,.88,8.03,-10],
// 3 82 -.65 8.84 -10 1.32 8.79 -10 .82 8.34 -10
  [3,82,-.65,8.84,-10,1.32,8.79,-10,.82,8.34,-10],
// 4 82 -.92 9.05 -10 1.21 9.38 -10 1.32 8.79 -10 -.65 8.84 -10
  [4,82,-.92,9.05,-10,1.21,9.38,-10,1.32,8.79,-10,-.65,8.84,-10],
// 3 82 -.92 9.05 -10 1.16 9.7 -10 1.21 9.38 -10
  [3,82,-.92,9.05,-10,1.16,9.7,-10,1.21,9.38,-10],
// 4 82 -1.45 9.14 -10 .88 10.34 -10 1.16 9.7 -10 -.92 9.05 -10
  [4,82,-1.45,9.14,-10,.88,10.34,-10,1.16,9.7,-10,-.92,9.05,-10],
// 4 82 -1.45 9.14 -10 -1.42 9.41 -10 .94 10.74 -10 .88 10.34 -10
  [4,82,-1.45,9.14,-10,-1.42,9.41,-10,.94,10.74,-10,.88,10.34,-10],
// 4 82 -1.42 9.41 -10 -1.68 9.61 -10 .74 11.22 -10 .94 10.74 -10
  [4,82,-1.42,9.41,-10,-1.68,9.61,-10,.74,11.22,-10,.94,10.74,-10],
// 4 82 -3.03 8.65 -10 -3.36 8.84 -10 -2.33 8.85 -10 -2.73 8.72 -10
  [4,82,-3.03,8.65,-10,-3.36,8.84,-10,-2.33,8.85,-10,-2.73,8.72,-10],
// 4 82 -3.38 9.48 -10 -2.13 9.23 -10 -2.33 8.85 -10 -3.36 8.84 -10
  [4,82,-3.38,9.48,-10,-2.13,9.23,-10,-2.33,8.85,-10,-3.36,8.84,-10],
// 4 82 -3.62 9.23 -10 -3.61 9.37 -10 -3.38 9.48 -10 -3.36 8.84 -10
  [4,82,-3.62,9.23,-10,-3.61,9.37,-10,-3.38,9.48,-10,-3.36,8.84,-10],
// 3 82 -3.38 9.48 -10 -2.93 9.51 -10 -2.13 9.23 -10
  [3,82,-3.38,9.48,-10,-2.93,9.51,-10,-2.13,9.23,-10],
// 4 82 -3.38 9.48 -10 -3.36 9.65 -10 -3.11 9.62 -10 -2.93 9.51 -10
  [4,82,-3.38,9.48,-10,-3.36,9.65,-10,-3.11,9.62,-10,-2.93,9.51,-10],
// 3 82 -2.93 9.51 -10 -2.64 9.61 -10 -2.13 9.23 -10
  [3,82,-2.93,9.51,-10,-2.64,9.61,-10,-2.13,9.23,-10],
// 4 82 -2.64 9.61 -10 -2.42 10.02 -10 -1.68 9.61 -10 -2.13 9.23 -10
  [4,82,-2.64,9.61,-10,-2.42,10.02,-10,-1.68,9.61,-10,-2.13,9.23,-10],
// 4 82 -2.42 10.02 -10 -2.1 10.51 -10 -1.77 10.74 -10 -1.68 9.61 -10
  [4,82,-2.42,10.02,-10,-2.1,10.51,-10,-1.77,10.74,-10,-1.68,9.61,-10],
// 4 82 -1.68 9.61 -10 -1.77 10.74 -10 -1.65 11.01 -10 .74 11.22 -10
  [4,82,-1.68,9.61,-10,-1.77,10.74,-10,-1.65,11.01,-10,.74,11.22,-10],
// 4 82 -3.73 12.15 -10 -2.35 12.06 -10 -3.25 11.36 -10 -3.71 11.75 -10
  [4,82,-3.73,12.15,-10,-2.35,12.06,-10,-3.25,11.36,-10,-3.71,11.75,-10],
// 3 82 -3.25 11.36 -10 -2.35 12.06 -10 -2.52 11.44 -10
  [3,82,-3.25,11.36,-10,-2.35,12.06,-10,-2.52,11.44,-10],
// 4 82 -2.52 11.44 -10 -2.35 12.06 -10 -1.47 11.68 -10 -1.74 11.17 -10
  [4,82,-2.52,11.44,-10,-2.35,12.06,-10,-1.47,11.68,-10,-1.74,11.17,-10],
// 4 82 -1.74 11.17 -10 -1.47 11.68 -10 .74 11.22 -10 -1.65 11.01 -10
  [4,82,-1.74,11.17,-10,-1.47,11.68,-10,.74,11.22,-10,-1.65,11.01,-10],
// 4 82 -1.47 11.68 -10 -1.38 11.89 -10 -.97 12.08 -10 .74 11.22 -10
  [4,82,-1.47,11.68,-10,-1.38,11.89,-10,-.97,12.08,-10,.74,11.22,-10],
// 4 82 -.97 12.08 -10 -.7 12.43 -10 .97 12.05 -10 .74 11.22 -10
  [4,82,-.97,12.08,-10,-.7,12.43,-10,.97,12.05,-10,.74,11.22,-10],
// 4 82 -.83 12.57 -10 1.08 12.71 -10 .97 12.05 -10 -.7 12.43 -10
  [4,82,-.83,12.57,-10,1.08,12.71,-10,.97,12.05,-10,-.7,12.43,-10],
// 4 82 -1.46 12.7 -10 1.23 14.61 -10 .9 13.56 -10 -.83 12.57 -10
  [4,82,-1.46,12.7,-10,1.23,14.61,-10,.9,13.56,-10,-.83,12.57,-10],
// 4 82 -1.81 13.04 -10 -1.81 13.32 -10 -1.64 13.54 -10 -1.46 12.7 -10
  [4,82,-1.81,13.04,-10,-1.81,13.32,-10,-1.64,13.54,-10,-1.46,12.7,-10],
// 4 82 1.23 14.61 -10 -1.46 12.7 -10 -1.64 13.54 -10 -.51 14.18 -10
  [4,82,1.23,14.61,-10,-1.46,12.7,-10,-1.64,13.54,-10,-.51,14.18,-10],
// 4 82 -1.85 13.83 -10 -1.19 14.19 -10 -.51 14.18 -10 -1.64 13.54 -10
  [4,82,-1.85,13.83,-10,-1.19,14.19,-10,-.51,14.18,-10,-1.64,13.54,-10],
// 4 82 -2.27 14.43 -10 -1.19 14.19 -10 -1.85 13.83 -10 -2.24 13.87 -10
  [4,82,-2.27,14.43,-10,-1.19,14.19,-10,-1.85,13.83,-10,-2.24,13.87,-10],
// 4 82 -3.22 13.87 -10 -2.97 14.08 -10 -2.24 13.87 -10 -3.06 13.7 -10
  [4,82,-3.22,13.87,-10,-2.97,14.08,-10,-2.24,13.87,-10,-3.06,13.7,-10],
// 4 82 -3.18 14.14 -10 -3.08 14.27 -10 -2.825 14.39 -10 -2.97 14.08 -10
  [4,82,-3.18,14.14,-10,-3.08,14.27,-10,-2.825,14.39,-10,-2.97,14.08,-10],
// 4 82 -2.97 14.08 -10 -2.825 14.39 -10 -2.27 14.43 -10 -2.24 13.87 -10
  [4,82,-2.97,14.08,-10,-2.825,14.39,-10,-2.27,14.43,-10,-2.24,13.87,-10],
// 4 82 -2.9 14.64 -10 -2.59 14.66 -10 -2.27 14.43 -10 -2.825 14.39 -10
  [4,82,-2.9,14.64,-10,-2.59,14.66,-10,-2.27,14.43,-10,-2.825,14.39,-10],
// 4 82 -.51 14.18 -10 -.11 14.53 -10 1.14 14.89 -10 1.23 14.61 -10
  [4,82,-.51,14.18,-10,-.11,14.53,-10,1.14,14.89,-10,1.23,14.61,-10],
// 4 82 -.11 14.53 -10 .15 15.21 -10 .71 15.61 -10 1.14 14.89 -10
  [4,82,-.11,14.53,-10,.15,15.21,-10,.71,15.61,-10,1.14,14.89,-10],
// 3 82 0 15.57 -10 .71 15.61 -10 .15 15.21 -10
  [3,82,0,15.57,-10,.71,15.61,-10,.15,15.21,-10],
// 4 82 -.53 15.91 -10 -.28 16.72 -10 .71 15.61 -10 0 15.57 -10
  [4,82,-.53,15.91,-10,-.28,16.72,-10,.71,15.61,-10,0,15.57,-10],
// 3 82 -.55 16.52 -10 -.28 16.72 -10 -.53 15.91 -10
  [3,82,-.55,16.52,-10,-.28,16.72,-10,-.53,15.91,-10],
// 4 82 -.94 16.28 -10 -.89 16.68 -10 -.55 16.52 -10 -.53 15.91 -10
  [4,82,-.94,16.28,-10,-.89,16.68,-10,-.55,16.52,-10,-.53,15.91,-10],
// 4 82 -1.19 16.1 -10 -.94 16.28 -10 -.53 15.91 -10 -.89 15.92 -10
  [4,82,-1.19,16.1,-10,-.94,16.28,-10,-.53,15.91,-10,-.89,15.92,-10],
// 4 82 -.83 12.57 -10 .9 13.56 -10 1.22 13.45 -10 1.08 12.71 -10
  [4,82,-.83,12.57,-10,.9,13.56,-10,1.22,13.45,-10,1.08,12.71,-10],
// 4 82 1.22 13.45 -10 1.66 13.81 -10 1.85 13.33 -10 1.08 12.71 -10
  [4,82,1.22,13.45,-10,1.66,13.81,-10,1.85,13.33,-10,1.08,12.71,-10],
// 4 82 1.66 13.81 -10 2.42 13.94 -10 2.16 13.5 -10 1.85 13.33 -10
  [4,82,1.66,13.81,-10,2.42,13.94,-10,2.16,13.5,-10,1.85,13.33,-10],
// 4 82 2.37 14.46 -10 2.42 13.94 -10 1.66 13.81 -10 1.81 14.4 -10
  [4,82,2.37,14.46,-10,2.42,13.94,-10,1.66,13.81,-10,1.81,14.4,-10],
// 3 82 1.81 14.4 -10 2.25 14.72 -10 2.37 14.46 -10
  [3,82,1.81,14.4,-10,2.25,14.72,-10,2.37,14.46,-10],
// 4 82 2.16 13.5 -10 2.42 13.94 -10 2.89 13.77 -10 2.5 13.33 -10
  [4,82,2.16,13.5,-10,2.42,13.94,-10,2.89,13.77,-10,2.5,13.33,-10],
// 3 82 2.5 13.33 -10 2.89 13.77 -10 3.01 13.46 -10
  [3,82,2.5,13.33,-10,2.89,13.77,-10,3.01,13.46,-10],
// 4 82 2.5 13.33 -10 3.01 13.46 -10 3.01 12.79 -10 2.37 12.96 -10
  [4,82,2.5,13.33,-10,3.01,13.46,-10,3.01,12.79,-10,2.37,12.96,-10],
// 4 82 2.37 12.96 -10 3.01 12.79 -10 2.62 12.13 -10 2.12 12.37 -10
  [4,82,2.37,12.96,-10,3.01,12.79,-10,2.62,12.13,-10,2.12,12.37,-10],
// 4 82 1.92 11.81 -10 2.12 12.37 -10 2.62 12.13 -10 2.55 11.8 -10
  [4,82,1.92,11.81,-10,2.12,12.37,-10,2.62,12.13,-10,2.55,11.8,-10],
// 4 82 1.86 11.42 -10 1.92 11.81 -10 2.55 11.8 -10 2.43 10.89 -10
  [4,82,1.86,11.42,-10,1.92,11.81,-10,2.55,11.8,-10,2.43,10.89,-10],
// 3 82 1.86 10.58 -10 1.86 11.42 -10 2.43 10.89 -10
  [3,82,1.86,10.58,-10,1.86,11.42,-10,2.43,10.89,-10],
// 4 82 1.86 10.58 -10 2.43 10.89 -10 2.52 10.51 -10 1.98 10.11 -10
  [4,82,1.86,10.58,-10,2.43,10.89,-10,2.52,10.51,-10,1.98,10.11,-10],
// 4 82 1.98 10.11 -10 2.52 10.51 -10 2.65 10.37 -10 2.27 9.75 -10
  [4,82,1.98,10.11,-10,2.52,10.51,-10,2.65,10.37,-10,2.27,9.75,-10],
// 3 82 2.27 9.75 -10 2.65 10.37 -10 2.69 9.7 -10
  [3,82,2.27,9.75,-10,2.65,10.37,-10,2.69,9.7,-10],
// 4 82 2.65 10.37 -10 2.74 10.47 -10 3.03 9.79 -10 2.69 9.7 -10
  [4,82,2.65,10.37,-10,2.74,10.47,-10,3.03,9.79,-10,2.69,9.7,-10],
// 3 82 2.74 10.47 -10 3.31 10.07 -10 3.03 9.79 -10
  [3,82,2.74,10.47,-10,3.31,10.07,-10,3.03,9.79,-10],
// 4 82 2.73 11.01 -10 3.33 10.81 -10 3.31 10.07 -10 2.74 10.47 -10
  [4,82,2.73,11.01,-10,3.33,10.81,-10,3.31,10.07,-10,2.74,10.47,-10],
// 4 82 2.73 11.01 -10 2.84 11.32 -10 3.06 11.45 -10 3.33 10.81 -10
  [4,82,2.73,11.01,-10,2.84,11.32,-10,3.06,11.45,-10,3.33,10.81,-10],
// 4 82 3.06 11.45 -10 3.37 11.45 -10 3.71 11.3 -10 3.33 10.81 -10
  [4,82,3.06,11.45,-10,3.37,11.45,-10,3.71,11.3,-10,3.33,10.81,-10],
// 3 82 3.33 10.81 -10 3.71 11.3 -10 3.81 11.16 -10
  [3,82,3.33,10.81,-10,3.71,11.3,-10,3.81,11.16,-10],
// 
// 0 // Top and Bottom Main Color Triangles
// 3 16 -10 0 -10 0 1.24 -10 10 0 -10
  [3,16,-10,0,-10,0,1.24,-10,10,0,-10],
// 3 16 0 23.1 -10 -10 24 -10 10 24 -10
  [3,16,0,23.1,-10,-10,24,-10,10,24,-10],
];
module ldraw_lib__3005pz0(step=0, col=false, unit=2/5, alt=false, line=0.2, solid=!$preview)
    makepoly(ldraw_lib__3005pz0(solid), step=step, col=col, unit=unit, alt=alt, line=line, solid=solid);
ldraw_lib__3005pz0(line=0.2);
